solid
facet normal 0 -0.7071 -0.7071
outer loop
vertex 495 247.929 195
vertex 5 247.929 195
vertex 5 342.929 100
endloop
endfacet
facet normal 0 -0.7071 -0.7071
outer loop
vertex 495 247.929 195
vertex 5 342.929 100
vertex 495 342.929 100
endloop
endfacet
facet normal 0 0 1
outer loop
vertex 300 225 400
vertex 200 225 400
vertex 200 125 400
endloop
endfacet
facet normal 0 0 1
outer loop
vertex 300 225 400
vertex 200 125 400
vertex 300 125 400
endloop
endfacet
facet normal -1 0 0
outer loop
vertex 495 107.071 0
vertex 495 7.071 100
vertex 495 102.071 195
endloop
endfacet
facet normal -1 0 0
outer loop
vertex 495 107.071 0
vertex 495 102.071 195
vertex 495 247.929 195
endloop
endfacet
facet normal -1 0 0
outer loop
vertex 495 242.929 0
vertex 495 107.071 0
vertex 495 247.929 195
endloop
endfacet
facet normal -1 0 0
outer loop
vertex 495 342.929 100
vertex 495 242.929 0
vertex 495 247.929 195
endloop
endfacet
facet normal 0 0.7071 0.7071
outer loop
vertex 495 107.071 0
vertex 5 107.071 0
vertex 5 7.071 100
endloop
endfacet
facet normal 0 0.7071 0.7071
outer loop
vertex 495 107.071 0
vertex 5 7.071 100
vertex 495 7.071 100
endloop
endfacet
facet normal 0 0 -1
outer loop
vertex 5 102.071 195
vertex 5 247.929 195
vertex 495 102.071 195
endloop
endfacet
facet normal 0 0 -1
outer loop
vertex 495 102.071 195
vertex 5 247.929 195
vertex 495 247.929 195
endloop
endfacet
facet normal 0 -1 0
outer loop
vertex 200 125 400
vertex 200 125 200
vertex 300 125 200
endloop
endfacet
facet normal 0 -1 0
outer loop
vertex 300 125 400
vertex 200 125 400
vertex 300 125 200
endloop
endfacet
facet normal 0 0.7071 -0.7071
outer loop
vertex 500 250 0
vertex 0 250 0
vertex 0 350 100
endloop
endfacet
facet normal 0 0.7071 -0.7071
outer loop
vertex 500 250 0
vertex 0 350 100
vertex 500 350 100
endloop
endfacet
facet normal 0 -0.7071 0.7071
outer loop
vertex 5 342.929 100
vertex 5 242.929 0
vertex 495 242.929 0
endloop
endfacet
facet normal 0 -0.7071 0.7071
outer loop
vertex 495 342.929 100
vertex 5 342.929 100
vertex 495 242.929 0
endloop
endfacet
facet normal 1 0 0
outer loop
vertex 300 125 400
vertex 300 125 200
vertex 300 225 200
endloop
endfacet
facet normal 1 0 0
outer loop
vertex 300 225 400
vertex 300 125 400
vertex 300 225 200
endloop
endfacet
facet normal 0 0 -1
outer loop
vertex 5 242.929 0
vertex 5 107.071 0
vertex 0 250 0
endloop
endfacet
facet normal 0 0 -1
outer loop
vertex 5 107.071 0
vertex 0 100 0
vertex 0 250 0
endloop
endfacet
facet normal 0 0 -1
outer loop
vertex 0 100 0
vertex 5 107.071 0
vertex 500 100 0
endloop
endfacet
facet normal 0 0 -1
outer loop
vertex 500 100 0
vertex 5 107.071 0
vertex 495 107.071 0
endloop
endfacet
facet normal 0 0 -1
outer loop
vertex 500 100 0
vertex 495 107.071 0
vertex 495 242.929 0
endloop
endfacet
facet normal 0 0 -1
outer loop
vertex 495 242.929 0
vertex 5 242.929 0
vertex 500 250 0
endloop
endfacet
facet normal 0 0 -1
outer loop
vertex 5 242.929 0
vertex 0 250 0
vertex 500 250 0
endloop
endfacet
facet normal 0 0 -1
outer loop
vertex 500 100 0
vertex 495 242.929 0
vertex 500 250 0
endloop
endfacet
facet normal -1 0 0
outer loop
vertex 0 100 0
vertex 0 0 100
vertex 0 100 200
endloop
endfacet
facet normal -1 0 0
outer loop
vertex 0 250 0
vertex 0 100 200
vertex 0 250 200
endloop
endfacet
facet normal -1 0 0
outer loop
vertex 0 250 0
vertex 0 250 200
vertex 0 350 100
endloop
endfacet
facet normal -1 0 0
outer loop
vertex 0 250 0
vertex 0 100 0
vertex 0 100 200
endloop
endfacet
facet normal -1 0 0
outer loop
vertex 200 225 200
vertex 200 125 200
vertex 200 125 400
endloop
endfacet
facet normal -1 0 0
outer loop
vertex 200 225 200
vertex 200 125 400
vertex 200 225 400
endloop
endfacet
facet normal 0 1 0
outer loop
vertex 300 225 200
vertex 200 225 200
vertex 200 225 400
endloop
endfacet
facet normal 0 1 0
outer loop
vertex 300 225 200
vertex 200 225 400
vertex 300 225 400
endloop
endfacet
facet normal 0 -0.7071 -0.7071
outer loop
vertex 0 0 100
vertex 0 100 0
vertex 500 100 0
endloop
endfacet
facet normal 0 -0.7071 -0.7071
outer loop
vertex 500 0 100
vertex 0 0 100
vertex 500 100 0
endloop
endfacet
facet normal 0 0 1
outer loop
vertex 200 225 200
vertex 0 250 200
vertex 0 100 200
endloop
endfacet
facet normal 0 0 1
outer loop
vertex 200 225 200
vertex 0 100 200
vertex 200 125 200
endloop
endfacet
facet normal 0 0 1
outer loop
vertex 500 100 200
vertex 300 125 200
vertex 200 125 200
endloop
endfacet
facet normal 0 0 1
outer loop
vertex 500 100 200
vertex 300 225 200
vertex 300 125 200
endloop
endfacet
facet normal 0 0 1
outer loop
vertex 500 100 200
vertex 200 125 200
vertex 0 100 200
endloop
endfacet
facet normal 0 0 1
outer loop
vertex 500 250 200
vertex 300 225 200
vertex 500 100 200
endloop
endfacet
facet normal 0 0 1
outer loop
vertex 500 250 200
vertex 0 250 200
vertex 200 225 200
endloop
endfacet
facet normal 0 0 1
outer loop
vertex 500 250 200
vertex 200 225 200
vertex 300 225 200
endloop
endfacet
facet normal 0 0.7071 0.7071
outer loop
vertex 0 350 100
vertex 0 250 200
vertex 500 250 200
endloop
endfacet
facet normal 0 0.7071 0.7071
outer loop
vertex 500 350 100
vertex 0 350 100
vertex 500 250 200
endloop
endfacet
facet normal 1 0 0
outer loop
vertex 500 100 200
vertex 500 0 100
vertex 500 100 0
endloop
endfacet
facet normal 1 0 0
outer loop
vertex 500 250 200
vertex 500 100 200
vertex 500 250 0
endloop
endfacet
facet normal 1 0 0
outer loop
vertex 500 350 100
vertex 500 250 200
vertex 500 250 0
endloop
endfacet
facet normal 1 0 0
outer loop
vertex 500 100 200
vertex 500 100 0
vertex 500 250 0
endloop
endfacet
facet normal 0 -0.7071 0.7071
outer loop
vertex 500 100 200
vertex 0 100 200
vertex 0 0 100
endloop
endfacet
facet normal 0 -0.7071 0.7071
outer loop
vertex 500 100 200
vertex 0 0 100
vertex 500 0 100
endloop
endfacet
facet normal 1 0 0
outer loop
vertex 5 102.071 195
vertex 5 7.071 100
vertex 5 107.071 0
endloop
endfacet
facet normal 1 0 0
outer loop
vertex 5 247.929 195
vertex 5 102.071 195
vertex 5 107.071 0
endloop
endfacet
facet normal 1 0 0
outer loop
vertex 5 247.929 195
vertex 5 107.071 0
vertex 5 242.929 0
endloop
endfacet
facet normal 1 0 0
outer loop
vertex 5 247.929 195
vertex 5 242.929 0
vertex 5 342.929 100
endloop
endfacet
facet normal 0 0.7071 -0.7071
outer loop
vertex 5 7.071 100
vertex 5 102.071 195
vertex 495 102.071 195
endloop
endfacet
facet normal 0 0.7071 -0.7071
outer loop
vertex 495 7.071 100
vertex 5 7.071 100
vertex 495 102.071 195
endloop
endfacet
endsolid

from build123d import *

# Parameters (mm, degrees)
SKETCH1_W           = 500
SKETCH1_H           = 350
BOSS_EXTRUDE1_DEPTH = 200
CHAMFER3_SIZE       = 100
SHELL2_T            = -5
SKETCH3_W           = 100
SKETCH3_H           = 100
BOSS_EXTRUDE3_DEPTH = 200


with BuildPart() as part:
    # Sketch1 → Boss-Extrude1 (new body)
    with BuildSketch(Plane.XY):
        with Locations((250, 175)):
            Rectangle(SKETCH1_W, SKETCH1_H)
    extrude(amount=BOSS_EXTRUDE1_DEPTH)

    # Chamfer3
    chamfer3_edges = [part.edges().sort_by_distance(p)[0] for p in [
        (250, 350, 0),
        (250, 350, 200),
        (250, 0, 0),
        (250, 0, 200),
    ]]
    chamfer(chamfer3_edges, length=CHAMFER3_SIZE - 0.0001)  # a hair under: the kernel refuses the full size

    # Shell2
    shell2_openings = [part.faces().sort_by_distance(p)[0] for p in [
        (250, 175, 0),
    ]]
    offset(amount=SHELL2_T, openings=shell2_openings, kind=Kind.INTERSECTION)

    # Sketch3 → Boss-Extrude3 (add)
    with BuildSketch(Plane.XY.offset(200)):
        with Locations((250, 175)):
            Rectangle(SKETCH3_W, SKETCH3_H)
    extrude(amount=BOSS_EXTRUDE3_DEPTH)


solid = part.part
